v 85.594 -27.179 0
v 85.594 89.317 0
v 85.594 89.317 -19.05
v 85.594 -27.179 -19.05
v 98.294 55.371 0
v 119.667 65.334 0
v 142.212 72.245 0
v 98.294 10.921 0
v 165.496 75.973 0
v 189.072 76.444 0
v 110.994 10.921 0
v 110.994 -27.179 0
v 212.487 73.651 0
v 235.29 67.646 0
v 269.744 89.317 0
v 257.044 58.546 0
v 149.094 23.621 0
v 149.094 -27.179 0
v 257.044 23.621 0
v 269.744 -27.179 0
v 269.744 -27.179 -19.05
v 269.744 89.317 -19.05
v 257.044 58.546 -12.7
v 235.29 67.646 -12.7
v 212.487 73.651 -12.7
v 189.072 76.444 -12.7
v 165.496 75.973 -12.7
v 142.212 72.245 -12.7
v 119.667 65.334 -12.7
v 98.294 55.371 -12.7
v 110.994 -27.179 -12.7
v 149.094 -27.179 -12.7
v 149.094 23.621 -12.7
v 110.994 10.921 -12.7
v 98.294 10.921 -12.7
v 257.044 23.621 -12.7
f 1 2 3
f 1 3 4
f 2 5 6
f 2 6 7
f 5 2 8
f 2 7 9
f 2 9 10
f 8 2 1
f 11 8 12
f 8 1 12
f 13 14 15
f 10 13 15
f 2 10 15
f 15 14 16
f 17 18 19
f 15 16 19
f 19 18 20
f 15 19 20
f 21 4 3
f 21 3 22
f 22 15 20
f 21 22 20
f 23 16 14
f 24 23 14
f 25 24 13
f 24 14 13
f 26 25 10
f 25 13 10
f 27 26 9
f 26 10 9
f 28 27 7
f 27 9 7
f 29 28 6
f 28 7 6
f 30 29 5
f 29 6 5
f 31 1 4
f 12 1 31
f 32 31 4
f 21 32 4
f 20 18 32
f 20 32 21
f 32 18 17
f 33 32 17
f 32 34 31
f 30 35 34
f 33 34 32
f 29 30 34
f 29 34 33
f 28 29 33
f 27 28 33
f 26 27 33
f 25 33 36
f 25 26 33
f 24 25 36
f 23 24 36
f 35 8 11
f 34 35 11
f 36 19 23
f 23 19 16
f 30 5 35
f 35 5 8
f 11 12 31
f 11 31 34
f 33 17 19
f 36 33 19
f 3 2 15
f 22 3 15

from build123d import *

# Parameters (mm, degrees)
F1_DEPTH = 12.7
F2_W     = 184.15
F2_H     = 116.4964555132
F3_DEPTH = 19.05
F4_DEPTH = 25.4
F5_W     = 38.1
F5_H     = 12.7
F6_DEPTH = 12.7


with BuildPart() as f1:
    # F0 (on Top) → F1 (new body)
    with BuildSketch(Plane.XY):
        with BuildLine():
            Line((98.2942968156, 10.920933083), (110.9942968156, 10.920933083))
            Line((110.9942968156, 10.920933083), (110.9942968156, -14.479066917))
            Line((110.9942968156, -14.479066917), (149.0942968156, -14.479066917))
            Line((149.0942968156, -14.479066917), (149.0942968156, 23.620933083))
            Line((149.0942968156, 23.620933083), (257.0442968156, 23.620933083))
            Line((257.0442968156, 23.620933083), (257.0442968156, 58.545933083))
            ThreePointArc((257.0442968156, 58.545933083), (177.2761177053, 76.6173885961), (98.2942968156, 55.370933083))
            Line((98.2942968156, 55.370933083), (98.2942968156, 10.920933083))
        make_face()
    extrude(amount=F1_DEPTH)

    # F2 (on face) → F3 (join)
    with BuildSketch(Plane(origin=(0, 0, 0), x_dir=(1, 0, 0), z_dir=(0, 0, -1))):
        with Locations((177.6692968156, -31.0691608395)):
            Rectangle(F2_W, F2_H)
    extrude(amount=F3_DEPTH)

    # F4 (cut): a face of the model
    f4_faces = [f1.faces().sort_by_distance(p)[0] for p in [
        (169.3940346963, 39.8760079107, 12.7),
    ]]
    extrude(f4_faces, amount=-F4_DEPTH, mode=Mode.SUBTRACT)

    # F5 (on face) → F6 (cut)
    with BuildSketch(Plane.XY):
        with Locations((130.0442968156, -20.829066917)):
            Rectangle(F5_W, F5_H)
    extrude(amount=-F6_DEPTH, mode=Mode.SUBTRACT)


solid = f1.part
